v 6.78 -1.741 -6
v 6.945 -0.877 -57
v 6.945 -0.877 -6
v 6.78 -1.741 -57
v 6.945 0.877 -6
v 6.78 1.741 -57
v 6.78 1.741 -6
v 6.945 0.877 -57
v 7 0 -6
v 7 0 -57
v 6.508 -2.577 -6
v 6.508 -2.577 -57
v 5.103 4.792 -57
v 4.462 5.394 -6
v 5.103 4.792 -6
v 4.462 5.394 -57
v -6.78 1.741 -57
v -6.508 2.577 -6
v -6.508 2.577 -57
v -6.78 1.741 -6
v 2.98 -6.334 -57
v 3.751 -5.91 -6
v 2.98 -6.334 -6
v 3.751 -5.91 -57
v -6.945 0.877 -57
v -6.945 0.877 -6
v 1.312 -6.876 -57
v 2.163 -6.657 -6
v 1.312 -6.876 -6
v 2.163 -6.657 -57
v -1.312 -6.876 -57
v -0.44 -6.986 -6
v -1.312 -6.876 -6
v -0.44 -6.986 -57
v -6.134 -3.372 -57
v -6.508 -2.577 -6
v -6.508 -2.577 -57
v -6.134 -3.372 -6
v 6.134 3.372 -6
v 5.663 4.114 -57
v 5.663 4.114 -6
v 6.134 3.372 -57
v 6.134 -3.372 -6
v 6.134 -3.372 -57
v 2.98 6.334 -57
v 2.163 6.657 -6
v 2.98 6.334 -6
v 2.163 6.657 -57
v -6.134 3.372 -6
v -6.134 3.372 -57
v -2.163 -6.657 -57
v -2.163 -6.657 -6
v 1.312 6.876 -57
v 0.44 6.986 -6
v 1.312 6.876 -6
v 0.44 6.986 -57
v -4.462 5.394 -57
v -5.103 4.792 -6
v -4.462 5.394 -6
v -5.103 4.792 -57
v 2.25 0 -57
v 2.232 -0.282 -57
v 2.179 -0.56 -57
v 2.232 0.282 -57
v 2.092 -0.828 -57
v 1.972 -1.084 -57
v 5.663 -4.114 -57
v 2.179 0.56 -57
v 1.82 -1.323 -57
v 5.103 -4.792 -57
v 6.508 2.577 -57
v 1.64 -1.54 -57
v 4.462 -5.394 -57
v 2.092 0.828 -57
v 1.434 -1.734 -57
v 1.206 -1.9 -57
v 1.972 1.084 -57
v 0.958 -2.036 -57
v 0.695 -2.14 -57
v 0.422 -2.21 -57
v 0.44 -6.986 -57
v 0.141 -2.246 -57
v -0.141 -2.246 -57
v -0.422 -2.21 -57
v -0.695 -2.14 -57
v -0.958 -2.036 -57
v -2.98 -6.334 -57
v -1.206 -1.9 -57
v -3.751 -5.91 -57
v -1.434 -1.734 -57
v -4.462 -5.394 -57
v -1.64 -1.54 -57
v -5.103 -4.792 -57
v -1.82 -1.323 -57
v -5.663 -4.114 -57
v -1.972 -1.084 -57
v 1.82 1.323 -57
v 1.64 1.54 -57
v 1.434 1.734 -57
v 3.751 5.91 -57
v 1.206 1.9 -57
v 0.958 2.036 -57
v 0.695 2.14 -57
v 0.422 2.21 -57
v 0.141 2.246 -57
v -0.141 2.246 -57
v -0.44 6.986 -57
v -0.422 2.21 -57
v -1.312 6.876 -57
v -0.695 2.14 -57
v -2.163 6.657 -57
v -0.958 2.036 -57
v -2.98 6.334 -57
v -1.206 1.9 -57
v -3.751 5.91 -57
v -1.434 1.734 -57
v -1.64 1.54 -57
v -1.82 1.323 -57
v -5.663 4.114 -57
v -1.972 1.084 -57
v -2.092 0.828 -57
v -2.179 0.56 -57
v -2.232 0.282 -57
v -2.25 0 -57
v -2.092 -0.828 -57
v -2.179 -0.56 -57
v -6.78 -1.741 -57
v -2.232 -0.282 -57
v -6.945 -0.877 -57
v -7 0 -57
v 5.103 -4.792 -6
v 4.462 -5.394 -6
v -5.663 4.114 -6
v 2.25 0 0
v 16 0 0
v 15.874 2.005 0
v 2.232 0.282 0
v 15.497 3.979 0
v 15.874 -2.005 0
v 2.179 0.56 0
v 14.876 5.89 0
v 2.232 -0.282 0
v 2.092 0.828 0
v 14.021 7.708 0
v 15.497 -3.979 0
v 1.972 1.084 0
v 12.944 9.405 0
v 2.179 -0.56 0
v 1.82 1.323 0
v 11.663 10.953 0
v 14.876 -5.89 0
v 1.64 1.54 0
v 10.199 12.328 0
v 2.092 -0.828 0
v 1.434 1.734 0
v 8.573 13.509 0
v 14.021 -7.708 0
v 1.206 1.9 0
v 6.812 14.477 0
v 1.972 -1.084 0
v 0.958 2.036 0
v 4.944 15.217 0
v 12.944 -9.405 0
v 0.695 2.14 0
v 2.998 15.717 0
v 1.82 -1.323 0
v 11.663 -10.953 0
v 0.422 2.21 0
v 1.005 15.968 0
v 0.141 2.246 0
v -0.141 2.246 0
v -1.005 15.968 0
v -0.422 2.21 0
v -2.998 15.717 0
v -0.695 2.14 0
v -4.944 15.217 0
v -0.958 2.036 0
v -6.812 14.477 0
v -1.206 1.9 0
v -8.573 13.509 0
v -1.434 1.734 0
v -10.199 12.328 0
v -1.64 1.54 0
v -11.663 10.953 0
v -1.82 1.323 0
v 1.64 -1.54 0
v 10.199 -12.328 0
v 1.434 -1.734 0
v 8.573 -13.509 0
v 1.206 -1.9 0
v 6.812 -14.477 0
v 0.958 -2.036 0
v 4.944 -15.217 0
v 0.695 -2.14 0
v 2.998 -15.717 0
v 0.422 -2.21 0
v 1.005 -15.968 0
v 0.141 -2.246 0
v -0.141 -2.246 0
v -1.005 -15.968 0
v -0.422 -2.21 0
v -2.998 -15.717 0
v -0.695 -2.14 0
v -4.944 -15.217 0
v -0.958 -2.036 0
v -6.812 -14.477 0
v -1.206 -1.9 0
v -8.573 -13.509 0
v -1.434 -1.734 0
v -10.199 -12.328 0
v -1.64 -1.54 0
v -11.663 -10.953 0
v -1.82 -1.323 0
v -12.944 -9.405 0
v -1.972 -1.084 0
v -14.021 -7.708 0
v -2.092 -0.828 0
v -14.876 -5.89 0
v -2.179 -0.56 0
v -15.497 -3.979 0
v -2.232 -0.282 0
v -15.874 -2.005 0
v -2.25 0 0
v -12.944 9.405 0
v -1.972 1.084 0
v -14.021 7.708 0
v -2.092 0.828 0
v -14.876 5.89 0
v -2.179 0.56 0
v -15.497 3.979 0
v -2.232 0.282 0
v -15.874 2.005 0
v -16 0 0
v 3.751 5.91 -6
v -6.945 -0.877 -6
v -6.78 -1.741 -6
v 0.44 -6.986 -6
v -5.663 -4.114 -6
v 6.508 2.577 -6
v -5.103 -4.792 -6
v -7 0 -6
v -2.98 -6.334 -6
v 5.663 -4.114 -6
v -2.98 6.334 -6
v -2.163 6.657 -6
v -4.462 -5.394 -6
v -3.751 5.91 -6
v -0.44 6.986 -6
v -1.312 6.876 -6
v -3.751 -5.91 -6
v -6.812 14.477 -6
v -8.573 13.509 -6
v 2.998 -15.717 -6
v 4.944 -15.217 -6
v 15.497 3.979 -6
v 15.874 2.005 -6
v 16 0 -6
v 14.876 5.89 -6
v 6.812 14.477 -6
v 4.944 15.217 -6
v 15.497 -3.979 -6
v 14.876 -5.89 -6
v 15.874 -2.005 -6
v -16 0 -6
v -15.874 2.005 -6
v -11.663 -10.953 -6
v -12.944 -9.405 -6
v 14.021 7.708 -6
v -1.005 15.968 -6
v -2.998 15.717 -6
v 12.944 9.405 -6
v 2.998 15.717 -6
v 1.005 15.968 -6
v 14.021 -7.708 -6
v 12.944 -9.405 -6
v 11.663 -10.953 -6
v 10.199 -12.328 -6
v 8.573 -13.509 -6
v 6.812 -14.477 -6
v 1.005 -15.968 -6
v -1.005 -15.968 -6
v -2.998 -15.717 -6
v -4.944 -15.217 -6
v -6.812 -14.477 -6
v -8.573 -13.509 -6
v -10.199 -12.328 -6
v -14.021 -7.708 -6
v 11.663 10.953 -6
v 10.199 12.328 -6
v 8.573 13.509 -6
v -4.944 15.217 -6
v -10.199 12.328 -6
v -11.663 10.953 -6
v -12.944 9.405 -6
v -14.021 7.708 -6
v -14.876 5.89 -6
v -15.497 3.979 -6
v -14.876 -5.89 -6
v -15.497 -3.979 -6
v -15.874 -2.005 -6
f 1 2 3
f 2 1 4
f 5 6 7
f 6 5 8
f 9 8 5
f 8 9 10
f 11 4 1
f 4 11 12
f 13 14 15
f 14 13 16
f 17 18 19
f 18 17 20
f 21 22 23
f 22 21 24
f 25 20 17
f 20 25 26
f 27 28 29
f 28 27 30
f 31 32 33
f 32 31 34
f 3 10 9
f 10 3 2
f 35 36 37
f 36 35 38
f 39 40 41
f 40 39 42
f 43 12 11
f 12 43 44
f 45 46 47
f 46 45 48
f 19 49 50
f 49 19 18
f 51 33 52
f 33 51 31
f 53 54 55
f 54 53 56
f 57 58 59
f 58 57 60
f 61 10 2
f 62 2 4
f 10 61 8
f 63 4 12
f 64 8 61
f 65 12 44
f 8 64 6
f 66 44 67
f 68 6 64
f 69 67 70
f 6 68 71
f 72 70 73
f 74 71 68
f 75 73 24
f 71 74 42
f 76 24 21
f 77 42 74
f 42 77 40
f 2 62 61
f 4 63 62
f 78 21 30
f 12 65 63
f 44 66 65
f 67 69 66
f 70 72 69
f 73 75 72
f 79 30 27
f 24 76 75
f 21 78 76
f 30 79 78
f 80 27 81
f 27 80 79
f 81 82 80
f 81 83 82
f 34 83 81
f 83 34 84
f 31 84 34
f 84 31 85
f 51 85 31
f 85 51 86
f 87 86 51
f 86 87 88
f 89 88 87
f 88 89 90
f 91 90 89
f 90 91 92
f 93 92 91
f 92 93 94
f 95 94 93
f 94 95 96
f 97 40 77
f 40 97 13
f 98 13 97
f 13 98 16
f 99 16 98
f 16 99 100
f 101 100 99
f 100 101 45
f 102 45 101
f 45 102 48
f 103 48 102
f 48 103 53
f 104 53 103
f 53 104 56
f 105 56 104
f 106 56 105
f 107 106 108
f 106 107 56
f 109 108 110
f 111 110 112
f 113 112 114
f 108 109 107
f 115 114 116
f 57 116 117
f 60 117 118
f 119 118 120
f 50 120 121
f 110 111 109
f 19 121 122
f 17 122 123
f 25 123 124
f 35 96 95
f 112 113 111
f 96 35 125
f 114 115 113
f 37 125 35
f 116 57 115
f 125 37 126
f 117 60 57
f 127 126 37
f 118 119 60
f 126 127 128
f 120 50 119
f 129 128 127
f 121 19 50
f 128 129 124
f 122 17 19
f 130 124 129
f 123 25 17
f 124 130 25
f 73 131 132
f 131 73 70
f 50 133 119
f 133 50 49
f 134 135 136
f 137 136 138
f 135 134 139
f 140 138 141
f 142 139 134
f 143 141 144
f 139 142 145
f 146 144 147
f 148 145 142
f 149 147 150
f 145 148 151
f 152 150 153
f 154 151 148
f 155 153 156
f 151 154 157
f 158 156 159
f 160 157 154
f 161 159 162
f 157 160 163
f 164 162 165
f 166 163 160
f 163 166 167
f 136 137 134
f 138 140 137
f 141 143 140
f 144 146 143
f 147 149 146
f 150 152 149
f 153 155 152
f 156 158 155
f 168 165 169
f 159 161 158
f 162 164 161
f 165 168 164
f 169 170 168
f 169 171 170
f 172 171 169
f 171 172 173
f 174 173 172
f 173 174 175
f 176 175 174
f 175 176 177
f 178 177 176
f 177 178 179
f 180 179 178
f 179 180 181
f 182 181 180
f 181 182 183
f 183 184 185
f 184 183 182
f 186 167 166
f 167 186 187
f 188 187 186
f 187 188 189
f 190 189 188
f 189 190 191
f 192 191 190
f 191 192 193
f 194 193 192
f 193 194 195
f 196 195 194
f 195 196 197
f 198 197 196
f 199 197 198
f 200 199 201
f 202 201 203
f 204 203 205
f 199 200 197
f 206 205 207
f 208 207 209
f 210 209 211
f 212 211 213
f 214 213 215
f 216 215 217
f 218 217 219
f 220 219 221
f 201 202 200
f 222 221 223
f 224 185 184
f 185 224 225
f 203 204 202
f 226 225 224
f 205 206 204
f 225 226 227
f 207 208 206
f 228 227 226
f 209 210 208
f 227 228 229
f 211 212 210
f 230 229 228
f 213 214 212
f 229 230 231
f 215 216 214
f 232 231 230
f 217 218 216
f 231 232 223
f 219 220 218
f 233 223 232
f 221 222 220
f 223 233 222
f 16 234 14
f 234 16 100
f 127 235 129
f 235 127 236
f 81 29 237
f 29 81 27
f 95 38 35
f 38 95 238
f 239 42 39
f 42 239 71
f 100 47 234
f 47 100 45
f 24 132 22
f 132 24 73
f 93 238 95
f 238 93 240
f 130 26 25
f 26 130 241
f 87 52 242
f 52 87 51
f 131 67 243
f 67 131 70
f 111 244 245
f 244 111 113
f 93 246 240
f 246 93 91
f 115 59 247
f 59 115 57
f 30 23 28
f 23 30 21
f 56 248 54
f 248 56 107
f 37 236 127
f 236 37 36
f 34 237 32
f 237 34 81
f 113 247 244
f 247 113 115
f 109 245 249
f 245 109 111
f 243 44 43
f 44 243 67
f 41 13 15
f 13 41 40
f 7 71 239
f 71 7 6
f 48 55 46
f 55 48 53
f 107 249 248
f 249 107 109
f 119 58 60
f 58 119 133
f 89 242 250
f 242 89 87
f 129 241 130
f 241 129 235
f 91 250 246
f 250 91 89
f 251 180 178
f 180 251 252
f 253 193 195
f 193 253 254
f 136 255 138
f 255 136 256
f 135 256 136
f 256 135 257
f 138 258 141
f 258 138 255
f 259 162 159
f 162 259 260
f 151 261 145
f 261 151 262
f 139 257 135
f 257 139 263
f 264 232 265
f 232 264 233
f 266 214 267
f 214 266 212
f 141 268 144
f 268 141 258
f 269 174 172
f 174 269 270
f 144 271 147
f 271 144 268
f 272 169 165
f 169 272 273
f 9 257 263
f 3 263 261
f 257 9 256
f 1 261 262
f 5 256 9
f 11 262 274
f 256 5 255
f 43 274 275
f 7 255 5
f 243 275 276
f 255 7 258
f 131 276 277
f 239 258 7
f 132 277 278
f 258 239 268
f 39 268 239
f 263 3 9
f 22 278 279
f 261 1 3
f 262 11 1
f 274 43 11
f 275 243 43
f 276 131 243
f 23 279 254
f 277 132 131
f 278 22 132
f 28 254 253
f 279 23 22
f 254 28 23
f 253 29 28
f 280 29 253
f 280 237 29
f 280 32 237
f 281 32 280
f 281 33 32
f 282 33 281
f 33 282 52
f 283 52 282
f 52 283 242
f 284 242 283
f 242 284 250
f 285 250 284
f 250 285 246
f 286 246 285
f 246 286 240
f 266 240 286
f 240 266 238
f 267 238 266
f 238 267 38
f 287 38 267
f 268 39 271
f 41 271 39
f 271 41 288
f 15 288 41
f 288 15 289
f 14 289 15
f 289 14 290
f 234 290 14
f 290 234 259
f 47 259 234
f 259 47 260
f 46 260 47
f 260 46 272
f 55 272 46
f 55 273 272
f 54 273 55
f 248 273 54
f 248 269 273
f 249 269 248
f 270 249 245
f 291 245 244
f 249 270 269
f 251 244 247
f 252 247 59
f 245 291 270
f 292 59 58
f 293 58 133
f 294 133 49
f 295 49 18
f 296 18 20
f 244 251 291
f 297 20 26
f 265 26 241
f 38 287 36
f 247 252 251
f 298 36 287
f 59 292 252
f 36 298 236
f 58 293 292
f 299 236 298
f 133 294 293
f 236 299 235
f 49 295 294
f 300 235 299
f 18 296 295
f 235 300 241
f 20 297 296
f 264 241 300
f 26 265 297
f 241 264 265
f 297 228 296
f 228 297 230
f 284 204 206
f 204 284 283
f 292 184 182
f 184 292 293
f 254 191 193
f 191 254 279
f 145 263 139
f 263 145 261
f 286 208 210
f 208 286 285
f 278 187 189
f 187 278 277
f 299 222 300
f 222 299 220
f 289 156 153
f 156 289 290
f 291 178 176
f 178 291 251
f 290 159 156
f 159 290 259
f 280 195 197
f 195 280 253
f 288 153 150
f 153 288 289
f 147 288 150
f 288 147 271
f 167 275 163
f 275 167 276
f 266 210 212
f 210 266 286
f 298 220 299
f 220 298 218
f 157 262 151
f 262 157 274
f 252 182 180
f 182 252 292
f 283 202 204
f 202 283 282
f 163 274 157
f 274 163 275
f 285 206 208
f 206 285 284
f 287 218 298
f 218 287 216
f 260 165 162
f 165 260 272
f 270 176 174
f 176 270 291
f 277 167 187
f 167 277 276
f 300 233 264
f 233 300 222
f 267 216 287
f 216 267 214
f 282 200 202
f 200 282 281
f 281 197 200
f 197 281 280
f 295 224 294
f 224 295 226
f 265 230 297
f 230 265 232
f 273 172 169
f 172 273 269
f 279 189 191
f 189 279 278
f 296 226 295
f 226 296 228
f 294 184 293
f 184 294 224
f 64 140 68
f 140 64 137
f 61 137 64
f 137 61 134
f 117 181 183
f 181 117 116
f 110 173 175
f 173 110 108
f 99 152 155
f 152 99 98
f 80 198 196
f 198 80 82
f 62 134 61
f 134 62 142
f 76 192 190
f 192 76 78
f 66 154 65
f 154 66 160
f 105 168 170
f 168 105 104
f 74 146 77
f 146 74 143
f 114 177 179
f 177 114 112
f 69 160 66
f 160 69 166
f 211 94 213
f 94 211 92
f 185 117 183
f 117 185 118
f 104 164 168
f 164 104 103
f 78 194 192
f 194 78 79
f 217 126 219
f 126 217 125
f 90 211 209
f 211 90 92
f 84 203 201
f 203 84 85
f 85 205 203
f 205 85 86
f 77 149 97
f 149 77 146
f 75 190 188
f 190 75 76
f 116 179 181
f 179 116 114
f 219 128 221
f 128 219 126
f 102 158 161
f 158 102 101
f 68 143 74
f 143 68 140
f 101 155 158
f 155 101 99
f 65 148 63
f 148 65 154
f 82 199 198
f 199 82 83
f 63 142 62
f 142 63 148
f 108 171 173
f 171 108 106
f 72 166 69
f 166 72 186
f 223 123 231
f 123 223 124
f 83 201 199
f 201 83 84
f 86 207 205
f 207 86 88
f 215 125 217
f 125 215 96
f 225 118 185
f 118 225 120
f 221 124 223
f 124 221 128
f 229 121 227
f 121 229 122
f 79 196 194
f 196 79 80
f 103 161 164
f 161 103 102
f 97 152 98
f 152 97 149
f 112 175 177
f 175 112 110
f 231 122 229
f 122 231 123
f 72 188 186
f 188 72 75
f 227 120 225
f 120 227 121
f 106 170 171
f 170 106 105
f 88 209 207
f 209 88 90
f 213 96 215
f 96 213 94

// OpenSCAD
$fn = 50;


difference() {
	union() {
		translate(v = [0, 0, -57.0000000000]) {
			cylinder(h = 57, r = 7.0000000000);
		}
		translate(v = [0, 0, -6.0000000000]) {
			cylinder(h = 6, r = 16.0000000000);
		}
	}
	union() {
		#translate(v = [0, 0, -57]) {
			cylinder(h = 57, r = 2.2500000000);
		}
	}
}
